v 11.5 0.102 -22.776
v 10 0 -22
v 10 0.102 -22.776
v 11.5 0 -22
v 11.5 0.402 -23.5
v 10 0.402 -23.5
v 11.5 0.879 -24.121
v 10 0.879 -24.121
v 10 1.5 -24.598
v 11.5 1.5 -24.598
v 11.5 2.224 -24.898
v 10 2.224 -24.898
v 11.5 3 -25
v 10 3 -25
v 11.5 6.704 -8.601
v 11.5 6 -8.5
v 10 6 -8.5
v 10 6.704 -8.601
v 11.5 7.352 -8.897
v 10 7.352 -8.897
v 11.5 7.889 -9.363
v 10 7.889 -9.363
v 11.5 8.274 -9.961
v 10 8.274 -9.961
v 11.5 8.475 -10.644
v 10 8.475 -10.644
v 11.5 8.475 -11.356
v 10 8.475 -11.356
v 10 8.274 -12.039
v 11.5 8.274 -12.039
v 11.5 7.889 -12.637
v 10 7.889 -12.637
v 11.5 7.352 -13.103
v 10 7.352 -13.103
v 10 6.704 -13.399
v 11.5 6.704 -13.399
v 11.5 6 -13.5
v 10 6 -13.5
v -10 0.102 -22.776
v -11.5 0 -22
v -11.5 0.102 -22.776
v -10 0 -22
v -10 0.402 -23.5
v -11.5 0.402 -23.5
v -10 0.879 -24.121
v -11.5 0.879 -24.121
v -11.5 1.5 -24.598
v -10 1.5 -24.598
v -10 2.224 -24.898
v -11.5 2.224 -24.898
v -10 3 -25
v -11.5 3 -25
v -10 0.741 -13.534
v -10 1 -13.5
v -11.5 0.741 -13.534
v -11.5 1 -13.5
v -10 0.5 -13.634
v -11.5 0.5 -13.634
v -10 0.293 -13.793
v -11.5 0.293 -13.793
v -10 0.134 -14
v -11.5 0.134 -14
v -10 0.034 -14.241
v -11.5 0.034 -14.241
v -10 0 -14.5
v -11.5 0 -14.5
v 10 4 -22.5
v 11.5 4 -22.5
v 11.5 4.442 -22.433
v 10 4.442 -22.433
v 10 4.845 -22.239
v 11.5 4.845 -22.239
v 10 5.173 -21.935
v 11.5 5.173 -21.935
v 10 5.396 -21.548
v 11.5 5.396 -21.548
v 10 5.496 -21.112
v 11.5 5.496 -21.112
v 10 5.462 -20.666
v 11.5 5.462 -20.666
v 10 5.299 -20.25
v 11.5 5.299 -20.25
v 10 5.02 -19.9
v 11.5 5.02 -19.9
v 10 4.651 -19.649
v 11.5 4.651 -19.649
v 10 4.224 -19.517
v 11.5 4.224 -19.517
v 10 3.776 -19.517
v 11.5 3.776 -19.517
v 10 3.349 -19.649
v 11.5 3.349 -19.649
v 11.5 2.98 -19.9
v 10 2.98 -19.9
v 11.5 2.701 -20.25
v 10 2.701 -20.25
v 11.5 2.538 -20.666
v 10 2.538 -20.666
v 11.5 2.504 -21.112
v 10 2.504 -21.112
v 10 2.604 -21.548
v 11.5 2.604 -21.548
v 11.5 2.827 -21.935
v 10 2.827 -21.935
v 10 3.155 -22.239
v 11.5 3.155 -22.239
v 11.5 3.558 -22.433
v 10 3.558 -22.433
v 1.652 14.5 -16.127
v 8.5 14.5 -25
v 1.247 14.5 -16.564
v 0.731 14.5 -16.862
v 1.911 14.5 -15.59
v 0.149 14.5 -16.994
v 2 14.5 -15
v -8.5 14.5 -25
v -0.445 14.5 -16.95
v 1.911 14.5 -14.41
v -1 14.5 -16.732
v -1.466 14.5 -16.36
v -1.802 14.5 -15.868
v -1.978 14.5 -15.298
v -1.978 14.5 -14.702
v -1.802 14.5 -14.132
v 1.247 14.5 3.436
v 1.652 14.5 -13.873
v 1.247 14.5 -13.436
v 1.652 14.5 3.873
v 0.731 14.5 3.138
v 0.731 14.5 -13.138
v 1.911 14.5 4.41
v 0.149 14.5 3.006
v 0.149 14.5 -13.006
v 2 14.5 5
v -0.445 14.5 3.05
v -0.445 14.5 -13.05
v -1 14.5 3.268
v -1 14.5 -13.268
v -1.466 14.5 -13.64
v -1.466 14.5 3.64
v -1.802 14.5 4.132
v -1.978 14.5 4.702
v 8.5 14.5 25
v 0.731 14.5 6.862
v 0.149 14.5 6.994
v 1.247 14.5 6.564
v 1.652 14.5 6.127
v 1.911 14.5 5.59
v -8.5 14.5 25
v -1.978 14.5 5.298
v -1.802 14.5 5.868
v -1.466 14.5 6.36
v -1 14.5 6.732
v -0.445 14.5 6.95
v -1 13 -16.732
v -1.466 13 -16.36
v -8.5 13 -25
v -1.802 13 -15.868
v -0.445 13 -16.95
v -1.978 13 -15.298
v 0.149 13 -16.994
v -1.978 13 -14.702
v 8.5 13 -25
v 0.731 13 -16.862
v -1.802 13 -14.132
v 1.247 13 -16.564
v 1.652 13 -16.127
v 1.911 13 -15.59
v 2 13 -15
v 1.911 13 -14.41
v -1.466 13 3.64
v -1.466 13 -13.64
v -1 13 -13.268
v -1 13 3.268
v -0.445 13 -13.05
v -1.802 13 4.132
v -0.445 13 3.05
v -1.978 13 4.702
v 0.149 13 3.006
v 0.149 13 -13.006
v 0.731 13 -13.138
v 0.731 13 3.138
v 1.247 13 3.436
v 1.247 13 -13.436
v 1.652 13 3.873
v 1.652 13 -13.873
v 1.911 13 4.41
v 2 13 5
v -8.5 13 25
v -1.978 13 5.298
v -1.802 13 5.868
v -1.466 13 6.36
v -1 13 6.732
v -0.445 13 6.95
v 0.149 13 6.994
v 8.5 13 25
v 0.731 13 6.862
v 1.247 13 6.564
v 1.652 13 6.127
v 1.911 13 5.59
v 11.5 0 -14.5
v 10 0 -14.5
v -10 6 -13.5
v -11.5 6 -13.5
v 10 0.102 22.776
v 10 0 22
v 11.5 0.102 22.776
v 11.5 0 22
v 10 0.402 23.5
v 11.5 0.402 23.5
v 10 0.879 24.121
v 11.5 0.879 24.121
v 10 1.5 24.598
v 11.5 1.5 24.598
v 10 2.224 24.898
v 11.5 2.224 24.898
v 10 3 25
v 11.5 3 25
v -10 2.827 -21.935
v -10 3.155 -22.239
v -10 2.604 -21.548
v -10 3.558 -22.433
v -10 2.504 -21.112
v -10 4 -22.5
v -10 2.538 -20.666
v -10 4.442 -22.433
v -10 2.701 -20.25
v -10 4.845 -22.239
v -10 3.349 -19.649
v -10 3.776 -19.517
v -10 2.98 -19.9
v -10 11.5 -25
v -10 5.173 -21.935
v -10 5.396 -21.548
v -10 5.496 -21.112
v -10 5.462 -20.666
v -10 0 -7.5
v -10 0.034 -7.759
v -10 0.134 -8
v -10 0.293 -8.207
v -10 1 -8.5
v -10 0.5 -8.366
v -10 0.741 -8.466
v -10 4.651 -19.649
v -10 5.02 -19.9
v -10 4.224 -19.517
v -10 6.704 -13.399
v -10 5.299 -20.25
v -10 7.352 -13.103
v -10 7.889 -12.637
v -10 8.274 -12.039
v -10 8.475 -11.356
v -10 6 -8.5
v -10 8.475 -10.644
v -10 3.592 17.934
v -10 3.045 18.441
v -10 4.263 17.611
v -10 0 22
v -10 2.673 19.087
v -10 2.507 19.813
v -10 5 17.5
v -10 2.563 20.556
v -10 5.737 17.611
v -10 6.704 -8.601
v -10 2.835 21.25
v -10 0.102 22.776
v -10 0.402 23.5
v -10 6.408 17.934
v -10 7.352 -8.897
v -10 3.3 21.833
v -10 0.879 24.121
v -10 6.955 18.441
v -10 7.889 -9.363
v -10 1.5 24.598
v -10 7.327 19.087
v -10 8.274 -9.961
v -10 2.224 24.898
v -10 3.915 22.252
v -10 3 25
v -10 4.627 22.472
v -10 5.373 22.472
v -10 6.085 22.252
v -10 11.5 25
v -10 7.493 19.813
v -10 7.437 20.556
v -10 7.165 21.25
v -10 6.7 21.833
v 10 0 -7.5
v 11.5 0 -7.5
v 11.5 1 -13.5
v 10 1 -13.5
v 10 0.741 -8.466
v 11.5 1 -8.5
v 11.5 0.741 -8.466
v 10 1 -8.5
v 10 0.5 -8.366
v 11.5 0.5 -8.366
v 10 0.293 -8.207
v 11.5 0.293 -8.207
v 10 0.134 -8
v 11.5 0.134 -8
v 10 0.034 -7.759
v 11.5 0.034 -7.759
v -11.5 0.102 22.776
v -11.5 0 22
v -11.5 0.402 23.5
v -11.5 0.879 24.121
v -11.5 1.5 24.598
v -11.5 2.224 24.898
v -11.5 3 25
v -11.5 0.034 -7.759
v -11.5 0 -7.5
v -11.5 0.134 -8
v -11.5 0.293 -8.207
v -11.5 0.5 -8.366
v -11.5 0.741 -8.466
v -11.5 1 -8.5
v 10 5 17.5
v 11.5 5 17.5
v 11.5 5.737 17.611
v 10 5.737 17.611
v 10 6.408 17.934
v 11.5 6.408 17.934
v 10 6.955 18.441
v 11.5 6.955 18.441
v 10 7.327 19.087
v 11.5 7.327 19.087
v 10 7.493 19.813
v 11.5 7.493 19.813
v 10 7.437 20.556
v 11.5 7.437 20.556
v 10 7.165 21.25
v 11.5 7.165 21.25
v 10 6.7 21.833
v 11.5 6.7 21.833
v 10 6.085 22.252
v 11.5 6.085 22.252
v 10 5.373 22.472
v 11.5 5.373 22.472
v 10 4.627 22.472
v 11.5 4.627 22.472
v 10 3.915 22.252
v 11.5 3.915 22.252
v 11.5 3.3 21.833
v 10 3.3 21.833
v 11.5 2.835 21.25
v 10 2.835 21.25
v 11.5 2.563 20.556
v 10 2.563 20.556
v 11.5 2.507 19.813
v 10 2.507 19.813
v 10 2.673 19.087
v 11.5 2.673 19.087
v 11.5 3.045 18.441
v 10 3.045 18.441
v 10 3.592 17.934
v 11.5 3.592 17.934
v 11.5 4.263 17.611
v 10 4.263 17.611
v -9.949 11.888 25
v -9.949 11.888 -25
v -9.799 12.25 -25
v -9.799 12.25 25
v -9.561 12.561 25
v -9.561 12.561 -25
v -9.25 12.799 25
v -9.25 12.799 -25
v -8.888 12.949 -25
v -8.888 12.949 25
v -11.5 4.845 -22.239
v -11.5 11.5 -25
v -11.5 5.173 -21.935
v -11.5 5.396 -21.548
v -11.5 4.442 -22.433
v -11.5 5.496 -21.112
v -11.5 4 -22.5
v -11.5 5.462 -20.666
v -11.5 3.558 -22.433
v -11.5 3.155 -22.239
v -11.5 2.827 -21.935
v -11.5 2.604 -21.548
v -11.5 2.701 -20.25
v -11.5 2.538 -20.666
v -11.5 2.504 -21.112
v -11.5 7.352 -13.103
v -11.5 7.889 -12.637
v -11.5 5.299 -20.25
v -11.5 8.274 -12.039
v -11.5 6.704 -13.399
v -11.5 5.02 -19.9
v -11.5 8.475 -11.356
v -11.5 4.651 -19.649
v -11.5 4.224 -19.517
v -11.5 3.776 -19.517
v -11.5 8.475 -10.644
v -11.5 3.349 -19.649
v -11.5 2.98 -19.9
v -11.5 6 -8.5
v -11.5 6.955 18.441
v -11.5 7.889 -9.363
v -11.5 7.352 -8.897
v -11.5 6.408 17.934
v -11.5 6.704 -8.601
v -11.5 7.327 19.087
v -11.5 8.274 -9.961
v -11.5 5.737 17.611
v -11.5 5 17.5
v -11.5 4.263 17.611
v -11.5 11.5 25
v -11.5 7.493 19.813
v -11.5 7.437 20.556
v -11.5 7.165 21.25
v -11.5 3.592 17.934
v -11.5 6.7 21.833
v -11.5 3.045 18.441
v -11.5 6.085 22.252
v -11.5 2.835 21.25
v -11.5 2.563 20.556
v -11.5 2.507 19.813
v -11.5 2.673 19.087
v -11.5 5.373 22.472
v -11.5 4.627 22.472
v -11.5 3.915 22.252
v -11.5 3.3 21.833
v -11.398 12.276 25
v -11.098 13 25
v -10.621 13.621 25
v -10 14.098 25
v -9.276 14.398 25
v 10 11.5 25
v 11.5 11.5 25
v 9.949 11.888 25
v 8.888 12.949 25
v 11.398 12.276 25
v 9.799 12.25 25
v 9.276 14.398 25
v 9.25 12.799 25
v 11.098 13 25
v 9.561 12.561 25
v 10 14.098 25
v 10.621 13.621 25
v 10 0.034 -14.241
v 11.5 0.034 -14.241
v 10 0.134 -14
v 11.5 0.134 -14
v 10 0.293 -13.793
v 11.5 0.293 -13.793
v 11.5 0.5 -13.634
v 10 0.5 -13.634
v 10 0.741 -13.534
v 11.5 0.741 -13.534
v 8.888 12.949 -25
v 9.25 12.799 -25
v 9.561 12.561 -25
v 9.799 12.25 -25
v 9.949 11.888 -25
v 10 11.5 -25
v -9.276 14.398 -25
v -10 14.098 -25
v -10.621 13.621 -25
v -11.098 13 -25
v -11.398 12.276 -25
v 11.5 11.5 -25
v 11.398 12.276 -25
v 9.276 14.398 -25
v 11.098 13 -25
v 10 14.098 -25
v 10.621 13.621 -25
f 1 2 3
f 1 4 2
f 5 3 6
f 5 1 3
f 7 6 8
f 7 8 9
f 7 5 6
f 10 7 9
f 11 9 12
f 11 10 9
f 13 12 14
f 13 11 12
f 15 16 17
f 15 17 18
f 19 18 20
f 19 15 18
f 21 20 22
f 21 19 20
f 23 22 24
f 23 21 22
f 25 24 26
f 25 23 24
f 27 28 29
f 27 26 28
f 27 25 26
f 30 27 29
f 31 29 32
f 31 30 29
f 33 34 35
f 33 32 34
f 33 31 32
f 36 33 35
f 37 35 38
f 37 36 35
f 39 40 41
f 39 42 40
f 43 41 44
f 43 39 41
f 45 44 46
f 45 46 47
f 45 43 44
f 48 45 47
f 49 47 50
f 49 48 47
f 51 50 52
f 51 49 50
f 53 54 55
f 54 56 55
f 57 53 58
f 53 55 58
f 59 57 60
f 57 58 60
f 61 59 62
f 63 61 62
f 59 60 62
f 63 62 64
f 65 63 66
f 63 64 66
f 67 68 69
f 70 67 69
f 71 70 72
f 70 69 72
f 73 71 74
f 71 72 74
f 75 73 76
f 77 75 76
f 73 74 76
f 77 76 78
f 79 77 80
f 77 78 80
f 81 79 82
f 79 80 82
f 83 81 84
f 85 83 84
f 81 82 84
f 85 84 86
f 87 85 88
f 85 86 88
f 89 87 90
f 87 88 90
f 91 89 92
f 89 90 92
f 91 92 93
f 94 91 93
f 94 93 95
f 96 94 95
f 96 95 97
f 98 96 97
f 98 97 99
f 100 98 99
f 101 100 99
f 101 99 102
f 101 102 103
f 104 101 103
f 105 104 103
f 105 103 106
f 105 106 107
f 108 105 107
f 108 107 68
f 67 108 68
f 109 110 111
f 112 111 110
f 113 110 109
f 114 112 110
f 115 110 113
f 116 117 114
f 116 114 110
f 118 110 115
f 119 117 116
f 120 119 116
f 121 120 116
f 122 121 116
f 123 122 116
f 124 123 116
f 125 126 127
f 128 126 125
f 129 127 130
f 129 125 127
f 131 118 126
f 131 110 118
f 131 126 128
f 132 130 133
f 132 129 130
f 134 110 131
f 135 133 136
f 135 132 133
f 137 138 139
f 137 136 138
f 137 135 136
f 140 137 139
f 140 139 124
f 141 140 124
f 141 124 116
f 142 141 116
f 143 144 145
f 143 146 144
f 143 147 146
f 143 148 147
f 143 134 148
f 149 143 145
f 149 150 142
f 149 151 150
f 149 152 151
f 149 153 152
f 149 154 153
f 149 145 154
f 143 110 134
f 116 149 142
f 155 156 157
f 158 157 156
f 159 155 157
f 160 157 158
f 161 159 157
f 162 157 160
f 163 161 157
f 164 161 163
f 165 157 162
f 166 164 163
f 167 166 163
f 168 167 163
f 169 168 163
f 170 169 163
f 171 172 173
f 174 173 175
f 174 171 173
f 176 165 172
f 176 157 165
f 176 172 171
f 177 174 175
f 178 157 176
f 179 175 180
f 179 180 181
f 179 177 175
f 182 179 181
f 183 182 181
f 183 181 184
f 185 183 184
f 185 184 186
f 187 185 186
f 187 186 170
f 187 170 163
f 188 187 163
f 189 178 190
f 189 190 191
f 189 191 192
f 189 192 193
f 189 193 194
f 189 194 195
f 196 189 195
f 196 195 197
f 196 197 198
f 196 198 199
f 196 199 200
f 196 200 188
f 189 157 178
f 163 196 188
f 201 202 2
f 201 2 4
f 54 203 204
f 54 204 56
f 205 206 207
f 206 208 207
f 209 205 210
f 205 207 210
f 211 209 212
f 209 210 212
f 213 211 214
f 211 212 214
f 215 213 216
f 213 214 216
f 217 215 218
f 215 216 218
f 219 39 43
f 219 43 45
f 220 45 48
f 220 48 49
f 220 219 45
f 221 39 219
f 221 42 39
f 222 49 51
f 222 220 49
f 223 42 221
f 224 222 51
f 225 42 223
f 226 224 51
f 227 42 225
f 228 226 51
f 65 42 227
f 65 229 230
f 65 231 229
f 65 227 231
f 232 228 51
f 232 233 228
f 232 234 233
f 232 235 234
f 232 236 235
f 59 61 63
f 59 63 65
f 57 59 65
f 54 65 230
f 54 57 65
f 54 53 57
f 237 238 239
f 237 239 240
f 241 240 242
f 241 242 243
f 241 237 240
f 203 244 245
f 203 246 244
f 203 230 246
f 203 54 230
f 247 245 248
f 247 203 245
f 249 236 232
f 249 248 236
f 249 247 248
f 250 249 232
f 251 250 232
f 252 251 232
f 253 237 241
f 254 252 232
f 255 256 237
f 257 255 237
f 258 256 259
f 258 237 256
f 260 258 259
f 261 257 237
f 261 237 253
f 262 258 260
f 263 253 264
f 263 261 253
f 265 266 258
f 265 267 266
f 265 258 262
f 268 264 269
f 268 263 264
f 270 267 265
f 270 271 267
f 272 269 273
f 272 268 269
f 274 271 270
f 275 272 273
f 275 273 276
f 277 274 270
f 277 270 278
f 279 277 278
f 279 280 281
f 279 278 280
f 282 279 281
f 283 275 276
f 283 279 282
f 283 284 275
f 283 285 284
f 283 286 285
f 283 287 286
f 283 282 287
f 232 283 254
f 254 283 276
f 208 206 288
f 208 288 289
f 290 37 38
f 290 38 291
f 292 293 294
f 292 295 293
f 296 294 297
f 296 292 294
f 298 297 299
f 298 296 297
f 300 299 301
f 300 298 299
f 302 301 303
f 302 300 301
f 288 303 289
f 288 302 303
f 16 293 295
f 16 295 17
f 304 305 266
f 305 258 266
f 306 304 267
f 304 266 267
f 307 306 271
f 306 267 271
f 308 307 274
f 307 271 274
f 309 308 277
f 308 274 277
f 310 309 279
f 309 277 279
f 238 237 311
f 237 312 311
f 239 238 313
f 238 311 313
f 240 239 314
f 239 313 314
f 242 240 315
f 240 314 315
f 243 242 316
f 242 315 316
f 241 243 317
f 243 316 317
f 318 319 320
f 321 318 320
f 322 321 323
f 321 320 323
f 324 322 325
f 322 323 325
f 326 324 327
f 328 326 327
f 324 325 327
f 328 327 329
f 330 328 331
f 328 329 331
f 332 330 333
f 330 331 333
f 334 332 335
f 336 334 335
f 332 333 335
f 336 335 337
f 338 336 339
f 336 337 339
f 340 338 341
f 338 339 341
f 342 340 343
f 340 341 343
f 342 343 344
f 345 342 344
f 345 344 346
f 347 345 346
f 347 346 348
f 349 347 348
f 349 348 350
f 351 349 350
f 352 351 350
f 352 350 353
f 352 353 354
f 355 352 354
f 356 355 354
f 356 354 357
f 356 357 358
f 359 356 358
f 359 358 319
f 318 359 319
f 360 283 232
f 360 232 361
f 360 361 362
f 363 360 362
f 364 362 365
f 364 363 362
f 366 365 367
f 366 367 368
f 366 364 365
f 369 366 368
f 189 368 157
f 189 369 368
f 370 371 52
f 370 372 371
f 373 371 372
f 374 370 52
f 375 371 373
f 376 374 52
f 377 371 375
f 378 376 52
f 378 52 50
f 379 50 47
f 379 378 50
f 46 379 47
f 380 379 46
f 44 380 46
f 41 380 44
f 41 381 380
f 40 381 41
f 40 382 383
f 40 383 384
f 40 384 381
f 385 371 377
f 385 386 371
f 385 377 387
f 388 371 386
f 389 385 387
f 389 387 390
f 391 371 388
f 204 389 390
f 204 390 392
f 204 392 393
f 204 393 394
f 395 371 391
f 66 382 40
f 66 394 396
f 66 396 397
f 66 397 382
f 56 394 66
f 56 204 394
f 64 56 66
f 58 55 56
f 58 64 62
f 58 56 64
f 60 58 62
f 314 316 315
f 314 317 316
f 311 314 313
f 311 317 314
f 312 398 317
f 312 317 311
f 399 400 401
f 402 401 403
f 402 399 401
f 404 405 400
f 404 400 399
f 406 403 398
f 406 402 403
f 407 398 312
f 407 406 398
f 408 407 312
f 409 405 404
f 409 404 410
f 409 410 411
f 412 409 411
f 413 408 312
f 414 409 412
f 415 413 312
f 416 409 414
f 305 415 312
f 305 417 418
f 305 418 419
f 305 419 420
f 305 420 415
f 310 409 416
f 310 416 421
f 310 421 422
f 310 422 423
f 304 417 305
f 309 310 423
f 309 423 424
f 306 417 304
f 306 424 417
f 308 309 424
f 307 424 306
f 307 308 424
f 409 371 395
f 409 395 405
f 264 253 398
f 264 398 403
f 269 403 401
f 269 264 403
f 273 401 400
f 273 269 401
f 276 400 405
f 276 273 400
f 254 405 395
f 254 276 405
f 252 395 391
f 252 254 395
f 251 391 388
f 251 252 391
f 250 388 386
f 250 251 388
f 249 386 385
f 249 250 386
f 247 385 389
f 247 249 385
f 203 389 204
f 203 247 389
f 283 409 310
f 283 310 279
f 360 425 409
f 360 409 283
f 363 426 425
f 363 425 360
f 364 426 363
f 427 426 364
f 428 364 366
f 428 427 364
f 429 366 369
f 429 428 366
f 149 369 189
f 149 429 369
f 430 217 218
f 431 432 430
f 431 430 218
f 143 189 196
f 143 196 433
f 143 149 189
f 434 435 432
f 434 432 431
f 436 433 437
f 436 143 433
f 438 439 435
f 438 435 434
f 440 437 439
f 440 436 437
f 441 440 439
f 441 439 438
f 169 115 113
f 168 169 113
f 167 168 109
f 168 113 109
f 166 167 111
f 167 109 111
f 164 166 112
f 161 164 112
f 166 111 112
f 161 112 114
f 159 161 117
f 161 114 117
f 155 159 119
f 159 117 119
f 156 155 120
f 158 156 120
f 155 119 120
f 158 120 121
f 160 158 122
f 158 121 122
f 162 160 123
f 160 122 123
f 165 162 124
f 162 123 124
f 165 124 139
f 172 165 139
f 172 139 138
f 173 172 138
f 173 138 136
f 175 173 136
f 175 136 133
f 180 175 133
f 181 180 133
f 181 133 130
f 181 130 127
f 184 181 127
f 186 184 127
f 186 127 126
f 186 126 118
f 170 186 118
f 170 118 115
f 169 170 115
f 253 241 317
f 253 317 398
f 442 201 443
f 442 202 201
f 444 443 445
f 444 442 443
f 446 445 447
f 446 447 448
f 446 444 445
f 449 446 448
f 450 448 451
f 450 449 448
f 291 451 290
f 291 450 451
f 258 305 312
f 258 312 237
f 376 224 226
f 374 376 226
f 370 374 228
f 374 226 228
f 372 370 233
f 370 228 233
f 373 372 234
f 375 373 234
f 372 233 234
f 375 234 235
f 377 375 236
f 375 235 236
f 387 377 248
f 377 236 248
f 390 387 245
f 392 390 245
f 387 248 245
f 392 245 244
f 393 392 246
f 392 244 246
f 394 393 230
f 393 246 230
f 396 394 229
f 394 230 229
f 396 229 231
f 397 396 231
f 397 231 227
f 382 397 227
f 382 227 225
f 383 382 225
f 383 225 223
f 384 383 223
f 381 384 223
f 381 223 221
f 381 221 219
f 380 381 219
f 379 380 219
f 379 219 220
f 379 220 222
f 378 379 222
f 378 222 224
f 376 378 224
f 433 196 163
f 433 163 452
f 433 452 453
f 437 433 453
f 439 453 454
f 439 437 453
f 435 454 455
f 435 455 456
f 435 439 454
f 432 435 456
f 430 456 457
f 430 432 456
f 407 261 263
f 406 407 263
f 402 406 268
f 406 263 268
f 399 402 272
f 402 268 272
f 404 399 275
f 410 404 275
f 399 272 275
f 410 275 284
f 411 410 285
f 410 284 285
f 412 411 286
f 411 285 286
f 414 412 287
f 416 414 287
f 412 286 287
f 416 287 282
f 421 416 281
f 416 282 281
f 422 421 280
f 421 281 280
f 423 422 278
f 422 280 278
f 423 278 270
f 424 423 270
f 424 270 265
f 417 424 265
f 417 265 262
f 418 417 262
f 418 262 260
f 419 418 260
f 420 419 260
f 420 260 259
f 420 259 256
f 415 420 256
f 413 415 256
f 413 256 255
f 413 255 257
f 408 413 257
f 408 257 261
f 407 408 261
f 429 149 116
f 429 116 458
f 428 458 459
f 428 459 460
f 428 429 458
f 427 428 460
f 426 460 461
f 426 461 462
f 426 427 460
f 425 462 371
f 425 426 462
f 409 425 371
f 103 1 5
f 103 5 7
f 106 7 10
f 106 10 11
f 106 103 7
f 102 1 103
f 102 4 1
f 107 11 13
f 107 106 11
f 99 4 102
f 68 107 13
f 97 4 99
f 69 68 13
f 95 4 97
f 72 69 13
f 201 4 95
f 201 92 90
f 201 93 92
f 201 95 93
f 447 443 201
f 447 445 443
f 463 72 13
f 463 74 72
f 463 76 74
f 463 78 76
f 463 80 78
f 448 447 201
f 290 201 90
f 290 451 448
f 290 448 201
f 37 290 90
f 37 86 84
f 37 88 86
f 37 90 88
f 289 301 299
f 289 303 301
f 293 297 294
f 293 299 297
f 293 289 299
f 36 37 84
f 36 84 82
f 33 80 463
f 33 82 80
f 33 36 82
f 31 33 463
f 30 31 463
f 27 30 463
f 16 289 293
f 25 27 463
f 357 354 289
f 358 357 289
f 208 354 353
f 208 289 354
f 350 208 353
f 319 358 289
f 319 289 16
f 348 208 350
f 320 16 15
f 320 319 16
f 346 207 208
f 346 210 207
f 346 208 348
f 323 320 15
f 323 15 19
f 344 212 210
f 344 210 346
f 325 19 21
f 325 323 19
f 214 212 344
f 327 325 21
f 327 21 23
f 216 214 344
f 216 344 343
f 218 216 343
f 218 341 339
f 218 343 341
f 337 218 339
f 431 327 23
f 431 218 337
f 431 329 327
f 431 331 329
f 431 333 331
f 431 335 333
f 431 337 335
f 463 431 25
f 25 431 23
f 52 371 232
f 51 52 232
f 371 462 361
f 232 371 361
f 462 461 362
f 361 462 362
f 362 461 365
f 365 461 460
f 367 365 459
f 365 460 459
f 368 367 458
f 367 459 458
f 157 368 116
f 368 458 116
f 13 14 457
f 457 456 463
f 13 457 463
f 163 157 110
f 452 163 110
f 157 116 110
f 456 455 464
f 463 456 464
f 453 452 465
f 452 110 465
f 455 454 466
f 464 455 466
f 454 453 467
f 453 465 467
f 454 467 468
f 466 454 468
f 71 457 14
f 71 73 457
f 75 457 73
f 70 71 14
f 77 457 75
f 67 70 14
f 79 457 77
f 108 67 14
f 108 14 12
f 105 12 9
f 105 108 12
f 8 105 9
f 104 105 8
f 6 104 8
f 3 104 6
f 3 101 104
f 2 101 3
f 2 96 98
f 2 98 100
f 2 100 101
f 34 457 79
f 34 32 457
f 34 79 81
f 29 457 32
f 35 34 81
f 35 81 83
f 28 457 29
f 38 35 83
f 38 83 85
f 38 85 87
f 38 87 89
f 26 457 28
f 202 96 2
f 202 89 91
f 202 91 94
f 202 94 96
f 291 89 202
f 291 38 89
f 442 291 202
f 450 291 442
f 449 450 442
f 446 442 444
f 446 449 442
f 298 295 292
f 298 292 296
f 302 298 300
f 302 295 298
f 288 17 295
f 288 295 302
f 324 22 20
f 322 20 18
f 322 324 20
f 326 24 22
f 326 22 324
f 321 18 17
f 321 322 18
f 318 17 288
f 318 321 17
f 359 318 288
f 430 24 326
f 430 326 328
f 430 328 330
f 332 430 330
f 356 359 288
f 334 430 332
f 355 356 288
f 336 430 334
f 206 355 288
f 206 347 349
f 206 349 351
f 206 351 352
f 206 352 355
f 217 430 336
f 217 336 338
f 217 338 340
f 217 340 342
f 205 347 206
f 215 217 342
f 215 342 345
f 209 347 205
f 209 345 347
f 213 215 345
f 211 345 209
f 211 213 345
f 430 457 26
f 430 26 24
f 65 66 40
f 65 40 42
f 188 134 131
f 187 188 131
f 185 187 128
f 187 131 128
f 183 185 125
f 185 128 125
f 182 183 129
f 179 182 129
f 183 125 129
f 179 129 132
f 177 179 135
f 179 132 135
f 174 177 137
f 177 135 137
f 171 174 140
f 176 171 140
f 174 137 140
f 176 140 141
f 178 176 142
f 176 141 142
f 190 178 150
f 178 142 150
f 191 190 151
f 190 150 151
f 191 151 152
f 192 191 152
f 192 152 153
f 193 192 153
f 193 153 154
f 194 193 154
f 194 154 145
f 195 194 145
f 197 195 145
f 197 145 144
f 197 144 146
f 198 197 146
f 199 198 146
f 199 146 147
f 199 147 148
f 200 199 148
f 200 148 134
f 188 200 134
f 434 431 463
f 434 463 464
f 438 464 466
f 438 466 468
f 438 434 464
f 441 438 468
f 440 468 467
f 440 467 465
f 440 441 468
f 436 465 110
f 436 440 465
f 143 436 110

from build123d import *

# Parameters (mm, degrees)
BOSS_EXTRUDE1_DEPTH = 25
FILLET1_R           = 3
CUT_EXTRUDE1_DEPTH  = 24
FILLET2_R           = 1
SKETCH3_R           = 2.5
CUT_EXTRUDE2_DEPTH  = 24
SKETCH4_R           = 1.5
CUT_EXTRUDE3_DEPTH  = 24
SKETCH5_R           = 2
CUT_EXTRUDE4_DEPTH  = 50


with BuildPart() as part:
    # Sketch1 → Boss-Extrude1 (new body, symmetric)
    with BuildSketch(Plane.XY):
        with BuildLine():
            Line((11.5, 0), (11.5, 11.5))
            ThreePointArc((11.5, 11.5), (10.621320344, 13.621320344), (8.5, 14.5))
            Line((8.5, 14.5), (-8.5, 14.5))
            ThreePointArc((-8.5, 14.5), (-10.621320344, 13.621320344), (-11.5, 11.5))
            Line((-11.5, 11.5), (-11.5, 0))
            Line((-11.5, 0), (-10, 0))
            Line((-10, 0), (-10, 11.5))
            ThreePointArc((-10, 11.5), (-9.560660172, 12.560660172), (-8.5, 13))
            Line((-8.5, 13), (8.5, 13))
            ThreePointArc((8.5, 13), (9.560660172, 12.560660172), (10, 11.5))
            Line((10, 11.5), (10, 0))
            Line((10, 0), (11.5, 0))
        make_face()
    extrude(amount=BOSS_EXTRUDE1_DEPTH, both=True)

    # Fillet1
    fillet1_edges = [part.edges().sort_by_distance(p)[0] for p in [
        (-10.75, 0, -25),
        (10.75, 0, -25),
        (-10.75, 0, 25),
        (10.75, 0, 25),
    ]]
    fillet(fillet1_edges, radius=FILLET1_R)

    # Sketch2 → Cut-Extrude1 (cut, through all)
    with BuildSketch(Plane(origin=(11.5, 0, 0), x_dir=(0, 0, -1), z_dir=(1, 0, 0))):
        with BuildLine():
            Line((8.5, 0), (8.5, 6))
            ThreePointArc((8.5, 6), (11, 8.5), (13.5, 6))
            Line((13.5, 6), (13.5, 0))
            Line((13.5, 0), (8.5, 0))
        make_face()
    extrude(amount=-CUT_EXTRUDE1_DEPTH, mode=Mode.SUBTRACT)

    # Fillet2
    fillet2_edges = [part.edges().sort_by_distance(p)[0] for p in [
        (-10.75, 0, -13.5),
        (10.75, 0, -13.5),
        (-10.75, 0, -8.5),
        (10.75, 0, -8.5),
    ]]
    fillet(fillet2_edges, radius=FILLET2_R)

    # Sketch3 → Cut-Extrude2 (cut, through all)
    with BuildSketch(Plane(origin=(11.5, 0, 0), x_dir=(0, 0, -1), z_dir=(1, 0, 0))):
        with Locations((-20, 5)):
            Circle(SKETCH3_R)
    extrude(amount=-CUT_EXTRUDE2_DEPTH, mode=Mode.SUBTRACT)

    # Sketch4 → Cut-Extrude3 (cut, through all)
    with BuildSketch(Plane(origin=(11.5, 0, 0), x_dir=(0, 0, -1), z_dir=(1, 0, 0))):
        with Locations((21, 4)):
            Circle(SKETCH4_R)
    extrude(amount=-CUT_EXTRUDE3_DEPTH, mode=Mode.SUBTRACT)

    # Sketch5 → Cut-Extrude4 (cut)
    with BuildSketch(Plane(origin=(0, 14.5, 0), x_dir=(1, 0, 0), z_dir=(0, 1, 0))):
        with Locations((0, 15)):
            Circle(SKETCH5_R)
        with Locations((0, -5)):
            Circle(SKETCH5_R)
    extrude(amount=-CUT_EXTRUDE4_DEPTH, mode=Mode.SUBTRACT)


solid = part.part
